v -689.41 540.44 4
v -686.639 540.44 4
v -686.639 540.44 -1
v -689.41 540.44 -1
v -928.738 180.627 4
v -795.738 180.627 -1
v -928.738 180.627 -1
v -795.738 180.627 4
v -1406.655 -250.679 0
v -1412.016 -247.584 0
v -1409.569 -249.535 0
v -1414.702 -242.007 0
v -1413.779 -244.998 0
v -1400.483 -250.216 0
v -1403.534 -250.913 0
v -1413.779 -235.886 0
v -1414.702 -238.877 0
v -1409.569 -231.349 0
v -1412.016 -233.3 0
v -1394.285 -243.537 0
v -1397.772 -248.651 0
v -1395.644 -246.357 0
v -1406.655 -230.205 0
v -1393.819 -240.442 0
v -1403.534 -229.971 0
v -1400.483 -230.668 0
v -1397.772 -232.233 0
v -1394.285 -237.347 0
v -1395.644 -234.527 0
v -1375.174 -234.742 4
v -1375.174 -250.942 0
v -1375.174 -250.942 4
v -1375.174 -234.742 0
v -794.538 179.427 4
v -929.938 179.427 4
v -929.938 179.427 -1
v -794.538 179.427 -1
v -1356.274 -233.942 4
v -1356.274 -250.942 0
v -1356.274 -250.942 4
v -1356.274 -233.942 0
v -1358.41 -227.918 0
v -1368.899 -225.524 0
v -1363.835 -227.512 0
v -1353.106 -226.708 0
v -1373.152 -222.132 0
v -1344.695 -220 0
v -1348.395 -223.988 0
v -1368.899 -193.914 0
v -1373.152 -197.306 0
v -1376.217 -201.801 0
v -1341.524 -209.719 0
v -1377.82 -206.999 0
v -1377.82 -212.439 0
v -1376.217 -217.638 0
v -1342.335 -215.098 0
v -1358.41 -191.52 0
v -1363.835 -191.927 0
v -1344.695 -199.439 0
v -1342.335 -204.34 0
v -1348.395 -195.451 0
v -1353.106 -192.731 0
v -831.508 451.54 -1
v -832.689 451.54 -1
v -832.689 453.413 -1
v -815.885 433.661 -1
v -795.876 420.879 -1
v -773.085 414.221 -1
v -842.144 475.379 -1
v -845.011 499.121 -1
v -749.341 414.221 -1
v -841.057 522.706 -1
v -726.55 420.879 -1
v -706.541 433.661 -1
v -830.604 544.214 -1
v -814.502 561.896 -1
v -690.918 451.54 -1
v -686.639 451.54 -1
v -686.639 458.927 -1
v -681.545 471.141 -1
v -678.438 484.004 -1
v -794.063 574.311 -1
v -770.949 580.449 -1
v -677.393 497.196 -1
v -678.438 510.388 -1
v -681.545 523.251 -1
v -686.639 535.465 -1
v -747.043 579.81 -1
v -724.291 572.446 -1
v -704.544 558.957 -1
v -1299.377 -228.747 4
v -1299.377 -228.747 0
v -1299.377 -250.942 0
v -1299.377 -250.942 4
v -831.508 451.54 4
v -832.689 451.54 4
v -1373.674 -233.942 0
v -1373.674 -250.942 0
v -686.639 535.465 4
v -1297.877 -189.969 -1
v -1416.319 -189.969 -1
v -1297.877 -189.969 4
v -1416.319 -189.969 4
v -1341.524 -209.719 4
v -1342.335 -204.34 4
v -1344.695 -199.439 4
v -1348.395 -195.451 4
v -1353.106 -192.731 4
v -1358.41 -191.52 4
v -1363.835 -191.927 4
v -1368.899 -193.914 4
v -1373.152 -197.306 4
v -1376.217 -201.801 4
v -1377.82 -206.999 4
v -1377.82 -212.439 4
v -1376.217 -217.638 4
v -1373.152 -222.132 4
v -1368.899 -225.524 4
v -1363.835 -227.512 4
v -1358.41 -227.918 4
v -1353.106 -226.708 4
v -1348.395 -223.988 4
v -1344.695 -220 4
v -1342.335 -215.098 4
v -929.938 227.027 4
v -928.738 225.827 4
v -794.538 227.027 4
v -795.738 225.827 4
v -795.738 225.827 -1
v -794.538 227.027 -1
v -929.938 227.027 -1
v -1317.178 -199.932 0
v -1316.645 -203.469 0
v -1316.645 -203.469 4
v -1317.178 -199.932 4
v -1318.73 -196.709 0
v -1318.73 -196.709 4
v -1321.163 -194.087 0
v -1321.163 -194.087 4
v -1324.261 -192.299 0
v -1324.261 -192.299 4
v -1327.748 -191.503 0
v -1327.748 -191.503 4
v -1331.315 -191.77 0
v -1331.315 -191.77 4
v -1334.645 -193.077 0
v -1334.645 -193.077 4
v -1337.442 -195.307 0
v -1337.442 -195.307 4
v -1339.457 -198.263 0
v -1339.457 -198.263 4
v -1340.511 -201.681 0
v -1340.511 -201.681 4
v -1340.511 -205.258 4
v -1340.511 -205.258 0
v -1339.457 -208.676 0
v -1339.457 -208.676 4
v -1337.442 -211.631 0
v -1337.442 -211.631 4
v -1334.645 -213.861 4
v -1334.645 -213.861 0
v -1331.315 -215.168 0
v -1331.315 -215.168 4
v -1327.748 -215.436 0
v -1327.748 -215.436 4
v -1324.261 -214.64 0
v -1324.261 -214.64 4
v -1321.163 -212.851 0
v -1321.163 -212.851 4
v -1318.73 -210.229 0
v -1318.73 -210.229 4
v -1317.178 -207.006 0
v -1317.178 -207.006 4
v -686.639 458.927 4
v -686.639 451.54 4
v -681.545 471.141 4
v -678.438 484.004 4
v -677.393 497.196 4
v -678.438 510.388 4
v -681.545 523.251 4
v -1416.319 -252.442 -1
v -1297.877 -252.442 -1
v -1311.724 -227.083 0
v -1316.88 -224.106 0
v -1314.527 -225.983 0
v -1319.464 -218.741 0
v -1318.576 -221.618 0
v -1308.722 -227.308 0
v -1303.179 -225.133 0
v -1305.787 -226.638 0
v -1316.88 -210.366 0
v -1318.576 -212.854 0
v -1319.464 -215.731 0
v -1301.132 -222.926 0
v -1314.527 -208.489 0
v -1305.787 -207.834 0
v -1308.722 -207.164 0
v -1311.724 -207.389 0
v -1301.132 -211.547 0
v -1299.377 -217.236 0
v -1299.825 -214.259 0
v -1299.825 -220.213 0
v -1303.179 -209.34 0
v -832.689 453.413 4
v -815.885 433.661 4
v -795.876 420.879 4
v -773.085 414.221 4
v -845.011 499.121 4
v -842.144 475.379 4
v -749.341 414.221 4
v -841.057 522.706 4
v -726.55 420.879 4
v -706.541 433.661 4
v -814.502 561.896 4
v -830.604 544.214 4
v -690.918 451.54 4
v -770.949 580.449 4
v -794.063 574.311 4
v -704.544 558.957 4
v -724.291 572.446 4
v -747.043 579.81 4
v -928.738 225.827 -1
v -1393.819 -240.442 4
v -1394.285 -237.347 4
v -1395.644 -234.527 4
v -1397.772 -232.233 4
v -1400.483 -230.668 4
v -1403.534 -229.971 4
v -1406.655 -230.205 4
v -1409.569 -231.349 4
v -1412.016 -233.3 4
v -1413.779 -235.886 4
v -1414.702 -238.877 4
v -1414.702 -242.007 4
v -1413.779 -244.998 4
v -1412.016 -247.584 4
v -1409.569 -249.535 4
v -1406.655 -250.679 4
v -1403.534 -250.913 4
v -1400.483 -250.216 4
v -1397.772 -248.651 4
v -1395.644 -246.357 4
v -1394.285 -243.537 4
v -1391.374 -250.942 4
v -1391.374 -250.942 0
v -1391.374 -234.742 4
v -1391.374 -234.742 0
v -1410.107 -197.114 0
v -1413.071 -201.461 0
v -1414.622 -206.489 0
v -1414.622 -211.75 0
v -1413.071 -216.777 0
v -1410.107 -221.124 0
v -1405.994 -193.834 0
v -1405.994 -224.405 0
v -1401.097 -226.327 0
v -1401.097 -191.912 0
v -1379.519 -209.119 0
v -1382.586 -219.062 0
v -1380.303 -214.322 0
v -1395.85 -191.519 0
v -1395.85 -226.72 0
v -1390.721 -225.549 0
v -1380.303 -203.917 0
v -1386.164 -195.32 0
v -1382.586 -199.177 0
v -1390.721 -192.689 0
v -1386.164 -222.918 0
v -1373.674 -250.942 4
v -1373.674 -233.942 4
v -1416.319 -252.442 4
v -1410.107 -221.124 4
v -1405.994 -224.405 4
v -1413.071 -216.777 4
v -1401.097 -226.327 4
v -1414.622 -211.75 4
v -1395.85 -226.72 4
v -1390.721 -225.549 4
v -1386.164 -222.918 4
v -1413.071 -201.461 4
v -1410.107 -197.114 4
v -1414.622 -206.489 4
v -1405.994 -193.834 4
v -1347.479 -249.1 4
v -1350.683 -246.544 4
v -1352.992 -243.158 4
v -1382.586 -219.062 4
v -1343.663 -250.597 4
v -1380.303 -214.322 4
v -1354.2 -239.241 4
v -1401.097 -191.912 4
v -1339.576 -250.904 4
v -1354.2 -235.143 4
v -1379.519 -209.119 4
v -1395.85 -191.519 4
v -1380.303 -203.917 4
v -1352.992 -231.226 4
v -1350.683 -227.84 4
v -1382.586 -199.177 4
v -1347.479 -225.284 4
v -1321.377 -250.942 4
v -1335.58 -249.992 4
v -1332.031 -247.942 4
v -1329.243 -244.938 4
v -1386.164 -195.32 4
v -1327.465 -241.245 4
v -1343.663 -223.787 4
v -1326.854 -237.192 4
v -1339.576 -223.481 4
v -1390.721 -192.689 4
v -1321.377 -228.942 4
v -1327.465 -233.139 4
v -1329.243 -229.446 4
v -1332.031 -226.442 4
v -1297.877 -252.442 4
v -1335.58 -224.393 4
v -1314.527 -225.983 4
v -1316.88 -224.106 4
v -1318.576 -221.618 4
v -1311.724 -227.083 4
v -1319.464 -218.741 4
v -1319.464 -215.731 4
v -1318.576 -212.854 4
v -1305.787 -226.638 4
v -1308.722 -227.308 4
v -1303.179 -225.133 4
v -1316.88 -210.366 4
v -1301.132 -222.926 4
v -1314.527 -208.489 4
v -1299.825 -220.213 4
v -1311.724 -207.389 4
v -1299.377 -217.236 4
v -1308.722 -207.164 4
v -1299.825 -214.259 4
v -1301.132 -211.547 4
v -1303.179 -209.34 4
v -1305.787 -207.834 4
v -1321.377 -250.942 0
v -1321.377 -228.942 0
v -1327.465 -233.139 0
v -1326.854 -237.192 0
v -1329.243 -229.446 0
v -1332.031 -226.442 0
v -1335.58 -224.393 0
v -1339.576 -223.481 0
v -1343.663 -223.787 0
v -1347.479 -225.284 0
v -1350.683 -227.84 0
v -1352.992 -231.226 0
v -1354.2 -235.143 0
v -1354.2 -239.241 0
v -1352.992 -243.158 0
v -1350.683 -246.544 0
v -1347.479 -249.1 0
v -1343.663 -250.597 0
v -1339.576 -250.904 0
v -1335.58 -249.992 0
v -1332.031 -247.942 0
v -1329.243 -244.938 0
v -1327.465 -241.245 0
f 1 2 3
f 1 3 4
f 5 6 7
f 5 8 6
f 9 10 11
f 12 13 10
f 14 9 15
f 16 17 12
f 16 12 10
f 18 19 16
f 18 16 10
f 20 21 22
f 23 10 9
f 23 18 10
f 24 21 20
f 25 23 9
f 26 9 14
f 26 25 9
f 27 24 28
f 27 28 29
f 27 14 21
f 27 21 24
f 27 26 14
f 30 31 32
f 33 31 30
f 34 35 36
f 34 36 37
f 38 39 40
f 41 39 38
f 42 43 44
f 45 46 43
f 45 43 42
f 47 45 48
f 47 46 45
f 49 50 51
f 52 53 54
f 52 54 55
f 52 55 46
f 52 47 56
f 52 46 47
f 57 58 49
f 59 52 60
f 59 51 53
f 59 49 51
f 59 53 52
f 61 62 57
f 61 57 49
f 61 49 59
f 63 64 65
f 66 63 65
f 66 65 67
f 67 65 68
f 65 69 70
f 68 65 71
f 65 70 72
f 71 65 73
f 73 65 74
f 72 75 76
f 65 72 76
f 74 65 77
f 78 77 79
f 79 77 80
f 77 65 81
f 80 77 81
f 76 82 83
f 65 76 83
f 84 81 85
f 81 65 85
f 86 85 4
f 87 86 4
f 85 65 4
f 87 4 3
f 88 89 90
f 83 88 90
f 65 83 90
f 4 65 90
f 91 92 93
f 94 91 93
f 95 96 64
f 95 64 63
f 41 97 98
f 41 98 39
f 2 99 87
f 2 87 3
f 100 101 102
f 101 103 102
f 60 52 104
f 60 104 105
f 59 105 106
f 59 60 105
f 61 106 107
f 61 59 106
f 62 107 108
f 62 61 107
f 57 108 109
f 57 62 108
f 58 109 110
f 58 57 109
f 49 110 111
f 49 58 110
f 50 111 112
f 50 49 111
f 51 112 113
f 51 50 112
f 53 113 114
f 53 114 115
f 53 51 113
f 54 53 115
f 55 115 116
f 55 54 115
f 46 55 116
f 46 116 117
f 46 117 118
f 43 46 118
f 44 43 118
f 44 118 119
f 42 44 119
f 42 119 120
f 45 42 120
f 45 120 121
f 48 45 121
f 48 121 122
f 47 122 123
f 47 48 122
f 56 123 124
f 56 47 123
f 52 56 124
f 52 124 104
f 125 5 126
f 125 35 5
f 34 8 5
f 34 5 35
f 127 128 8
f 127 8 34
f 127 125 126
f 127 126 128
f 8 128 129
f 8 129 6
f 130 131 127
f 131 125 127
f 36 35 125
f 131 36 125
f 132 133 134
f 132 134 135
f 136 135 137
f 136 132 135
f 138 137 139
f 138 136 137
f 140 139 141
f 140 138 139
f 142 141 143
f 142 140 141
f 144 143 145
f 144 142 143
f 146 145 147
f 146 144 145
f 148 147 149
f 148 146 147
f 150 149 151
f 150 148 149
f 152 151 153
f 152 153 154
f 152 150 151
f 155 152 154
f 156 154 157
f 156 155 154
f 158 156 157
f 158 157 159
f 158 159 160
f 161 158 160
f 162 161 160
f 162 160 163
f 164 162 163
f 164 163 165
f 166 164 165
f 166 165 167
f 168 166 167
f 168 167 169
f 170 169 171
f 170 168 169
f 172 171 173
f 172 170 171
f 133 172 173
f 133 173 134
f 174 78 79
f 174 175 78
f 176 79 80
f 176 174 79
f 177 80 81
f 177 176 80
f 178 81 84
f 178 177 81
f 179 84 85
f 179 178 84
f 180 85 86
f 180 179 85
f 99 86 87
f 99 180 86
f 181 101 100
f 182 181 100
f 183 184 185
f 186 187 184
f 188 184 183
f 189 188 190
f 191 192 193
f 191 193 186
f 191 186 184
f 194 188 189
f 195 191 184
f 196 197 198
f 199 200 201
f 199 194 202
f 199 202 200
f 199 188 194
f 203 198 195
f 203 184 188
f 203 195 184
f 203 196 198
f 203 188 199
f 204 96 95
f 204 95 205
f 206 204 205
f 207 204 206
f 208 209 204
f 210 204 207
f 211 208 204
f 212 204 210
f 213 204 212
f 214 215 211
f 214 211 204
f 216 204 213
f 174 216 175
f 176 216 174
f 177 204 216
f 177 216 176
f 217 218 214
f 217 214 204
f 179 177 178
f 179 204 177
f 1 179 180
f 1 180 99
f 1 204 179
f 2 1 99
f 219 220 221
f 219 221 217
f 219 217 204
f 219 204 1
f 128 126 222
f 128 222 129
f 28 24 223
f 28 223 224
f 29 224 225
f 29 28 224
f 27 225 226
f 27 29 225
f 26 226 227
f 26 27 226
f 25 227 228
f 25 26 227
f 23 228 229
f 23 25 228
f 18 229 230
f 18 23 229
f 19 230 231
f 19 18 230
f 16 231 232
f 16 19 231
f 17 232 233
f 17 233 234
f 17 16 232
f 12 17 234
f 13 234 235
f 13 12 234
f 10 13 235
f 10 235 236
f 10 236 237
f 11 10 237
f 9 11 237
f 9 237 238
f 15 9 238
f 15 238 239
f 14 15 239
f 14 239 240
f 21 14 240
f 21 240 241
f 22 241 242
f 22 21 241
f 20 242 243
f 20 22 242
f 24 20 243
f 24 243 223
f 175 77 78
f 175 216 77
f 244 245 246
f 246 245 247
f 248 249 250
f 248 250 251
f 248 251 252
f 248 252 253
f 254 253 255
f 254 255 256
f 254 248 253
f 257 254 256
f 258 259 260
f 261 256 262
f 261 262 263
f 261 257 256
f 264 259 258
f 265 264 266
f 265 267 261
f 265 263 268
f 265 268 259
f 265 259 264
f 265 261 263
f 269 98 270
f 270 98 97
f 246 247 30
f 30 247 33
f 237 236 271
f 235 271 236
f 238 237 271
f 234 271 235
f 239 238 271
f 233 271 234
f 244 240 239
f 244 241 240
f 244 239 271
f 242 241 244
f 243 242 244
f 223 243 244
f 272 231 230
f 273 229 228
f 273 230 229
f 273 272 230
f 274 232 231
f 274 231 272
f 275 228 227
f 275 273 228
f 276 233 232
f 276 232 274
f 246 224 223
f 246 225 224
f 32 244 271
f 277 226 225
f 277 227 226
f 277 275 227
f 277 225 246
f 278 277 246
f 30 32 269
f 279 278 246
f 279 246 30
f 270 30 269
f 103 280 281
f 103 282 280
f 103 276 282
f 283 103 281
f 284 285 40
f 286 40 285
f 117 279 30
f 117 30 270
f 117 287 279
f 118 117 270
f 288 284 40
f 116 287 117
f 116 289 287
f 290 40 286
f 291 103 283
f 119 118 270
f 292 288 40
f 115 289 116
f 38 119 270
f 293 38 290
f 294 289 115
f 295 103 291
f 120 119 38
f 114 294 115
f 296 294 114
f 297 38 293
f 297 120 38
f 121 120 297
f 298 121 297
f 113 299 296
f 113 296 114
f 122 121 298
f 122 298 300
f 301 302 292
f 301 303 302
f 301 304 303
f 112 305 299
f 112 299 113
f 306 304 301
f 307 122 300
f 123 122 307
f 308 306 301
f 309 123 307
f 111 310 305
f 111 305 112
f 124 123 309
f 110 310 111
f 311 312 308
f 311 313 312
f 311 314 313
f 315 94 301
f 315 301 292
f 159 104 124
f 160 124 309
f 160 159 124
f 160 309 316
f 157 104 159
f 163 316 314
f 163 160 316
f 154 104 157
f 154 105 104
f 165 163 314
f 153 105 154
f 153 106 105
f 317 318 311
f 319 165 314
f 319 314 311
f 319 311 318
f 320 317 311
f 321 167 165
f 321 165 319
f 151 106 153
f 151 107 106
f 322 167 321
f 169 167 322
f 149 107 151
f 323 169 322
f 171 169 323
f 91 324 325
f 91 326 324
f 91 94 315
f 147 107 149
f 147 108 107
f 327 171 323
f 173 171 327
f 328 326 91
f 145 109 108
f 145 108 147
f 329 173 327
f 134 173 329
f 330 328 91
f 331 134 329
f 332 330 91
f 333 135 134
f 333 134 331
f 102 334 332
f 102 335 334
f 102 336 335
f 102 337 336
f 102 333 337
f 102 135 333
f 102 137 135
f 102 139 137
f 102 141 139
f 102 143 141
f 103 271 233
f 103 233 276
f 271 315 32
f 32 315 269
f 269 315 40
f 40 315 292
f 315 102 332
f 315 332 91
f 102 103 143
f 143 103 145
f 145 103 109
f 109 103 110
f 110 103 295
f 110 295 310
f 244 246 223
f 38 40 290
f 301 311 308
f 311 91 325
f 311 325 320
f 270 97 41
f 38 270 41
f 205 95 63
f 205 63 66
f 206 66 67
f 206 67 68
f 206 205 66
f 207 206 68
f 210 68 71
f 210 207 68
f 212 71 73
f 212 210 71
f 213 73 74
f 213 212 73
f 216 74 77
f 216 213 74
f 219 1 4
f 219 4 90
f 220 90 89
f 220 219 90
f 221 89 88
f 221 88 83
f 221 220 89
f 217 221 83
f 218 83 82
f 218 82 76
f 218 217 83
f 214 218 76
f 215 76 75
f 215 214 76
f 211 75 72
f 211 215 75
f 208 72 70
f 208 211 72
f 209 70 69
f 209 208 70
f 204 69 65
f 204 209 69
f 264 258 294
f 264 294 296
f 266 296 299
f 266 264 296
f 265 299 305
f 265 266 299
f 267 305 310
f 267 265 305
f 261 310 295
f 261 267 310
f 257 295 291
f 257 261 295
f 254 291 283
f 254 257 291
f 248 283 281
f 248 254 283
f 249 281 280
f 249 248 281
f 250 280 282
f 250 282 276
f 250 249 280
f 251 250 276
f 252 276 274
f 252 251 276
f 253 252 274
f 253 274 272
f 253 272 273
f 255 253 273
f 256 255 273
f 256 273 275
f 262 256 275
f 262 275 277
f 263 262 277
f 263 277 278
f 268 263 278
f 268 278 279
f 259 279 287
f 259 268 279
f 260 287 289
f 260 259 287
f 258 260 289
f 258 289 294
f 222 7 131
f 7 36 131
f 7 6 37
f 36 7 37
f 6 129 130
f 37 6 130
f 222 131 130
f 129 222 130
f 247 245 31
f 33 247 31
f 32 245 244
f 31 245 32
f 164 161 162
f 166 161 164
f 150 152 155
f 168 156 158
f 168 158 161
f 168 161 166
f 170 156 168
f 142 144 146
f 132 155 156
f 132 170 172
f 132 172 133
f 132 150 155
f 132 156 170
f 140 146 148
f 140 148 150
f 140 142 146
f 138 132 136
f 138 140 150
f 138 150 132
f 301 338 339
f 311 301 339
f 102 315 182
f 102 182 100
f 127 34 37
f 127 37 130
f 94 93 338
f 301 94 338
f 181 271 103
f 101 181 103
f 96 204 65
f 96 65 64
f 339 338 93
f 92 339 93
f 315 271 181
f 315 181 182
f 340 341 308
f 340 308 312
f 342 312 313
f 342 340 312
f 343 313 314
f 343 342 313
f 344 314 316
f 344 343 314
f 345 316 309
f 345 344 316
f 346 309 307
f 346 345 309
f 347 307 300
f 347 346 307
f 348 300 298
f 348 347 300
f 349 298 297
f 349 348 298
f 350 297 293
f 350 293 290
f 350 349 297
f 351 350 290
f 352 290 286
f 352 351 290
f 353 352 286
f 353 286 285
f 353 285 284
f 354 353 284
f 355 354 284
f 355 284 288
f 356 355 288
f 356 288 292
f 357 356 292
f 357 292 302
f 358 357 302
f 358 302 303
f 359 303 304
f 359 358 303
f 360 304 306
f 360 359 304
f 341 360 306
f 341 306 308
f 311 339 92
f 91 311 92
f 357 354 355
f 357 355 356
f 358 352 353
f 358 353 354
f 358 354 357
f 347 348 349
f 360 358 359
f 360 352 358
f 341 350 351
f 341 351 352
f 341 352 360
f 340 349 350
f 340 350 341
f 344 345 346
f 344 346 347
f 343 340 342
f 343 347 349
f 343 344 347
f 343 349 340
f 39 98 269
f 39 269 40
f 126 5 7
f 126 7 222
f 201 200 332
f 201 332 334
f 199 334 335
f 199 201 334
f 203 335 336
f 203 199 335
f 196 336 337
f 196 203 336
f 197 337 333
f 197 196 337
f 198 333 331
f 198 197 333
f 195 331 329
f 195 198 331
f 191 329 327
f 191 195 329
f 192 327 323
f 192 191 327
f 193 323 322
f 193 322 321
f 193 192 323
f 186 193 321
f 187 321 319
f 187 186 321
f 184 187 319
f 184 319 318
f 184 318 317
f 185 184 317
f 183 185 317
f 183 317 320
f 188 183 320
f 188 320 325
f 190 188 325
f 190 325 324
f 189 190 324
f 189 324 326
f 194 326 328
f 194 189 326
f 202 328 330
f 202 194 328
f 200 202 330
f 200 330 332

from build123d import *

# Parameters (mm, degrees)
F1_DEPTH = 4
F0_W     = 118.4424577934
F0_H     = 62.4728963787
F0_R     = 10.5
F0_W_2   = 16.2
F0_H_2   = 16.2
F0_R_2   = 17.65
F0_W_3   = 17.4
F0_H_3   = 17
F0_R_3   = 13.75
F0_R_4   = 18.25
F0_R_5   = 12
F0_R_6   = 10.1
F0_W_4   = 135.4
F0_H_4   = 47.6
F2_DEPTH = 1


with BuildPart() as f1:
    # F0 (on Top) → F1 (new body)
    with BuildSketch(Plane.XY):
        with BuildLine():
            ThreePointArc((-686.6390468597, 458.9270639063), (-679.7373422487, 477.5109614145), (-677.3930641937, 497.1959590912))
            ThreePointArc((-677.3930641937, 497.1959590912), (-679.7373422487, 516.8809567679), (-686.6390468597, 535.4648542761))
            Line((-686.6390468597, 535.4648542761), (-686.6390468597, 458.9270639063))
        make_face()
        with BuildLine():
            Line((-686.6390468597, 458.9270639063), (-686.6390468597, 535.4648542761))
            ThreePointArc((-686.6390468597, 535.4648542761), (-687.9821758707, 537.9762165133), (-689.4098463827, 540.4404999256))
            Line((-689.4098463827, 540.4404999256), (-832.6890468597, 540.4404999256))
            Line((-832.6890468597, 540.4404999256), (-832.6890468597, 453.4126711616))
            ThreePointArc((-832.6890468597, 453.4126711616), (-832.104680652, 452.4726864479), (-831.507953399, 451.5404999256))
            Line((-831.507953399, 451.5404999256), (-690.9181749885, 451.5404999256))
            ThreePointArc((-690.9181749885, 451.5404999256), (-688.6845156605, 455.1792713627), (-686.6390468597, 458.9270639063))
        make_face()
        with BuildLine():
            ThreePointArc((-689.4098463827, 540.4404999256), (-687.9821758707, 537.9762165133), (-686.6390468597, 535.4648542761))
            Line((-686.6390468597, 535.4648542761), (-686.6390468597, 540.4404999256))
            Line((-686.6390468597, 540.4404999256), (-689.4098463827, 540.4404999256))
        make_face()
        with BuildLine():
            Line((-686.6390468597, 451.5404999256), (-686.6390468597, 458.9270639063))
            ThreePointArc((-686.6390468597, 458.9270639063), (-688.6845156605, 455.1792713627), (-690.9181749885, 451.5404999256))
            Line((-690.9181749885, 451.5404999256), (-686.6390468597, 451.5404999256))
        make_face()
        with BuildLine():
            Line((-832.6890468597, 540.4404999256), (-689.4098463827, 540.4404999256))
            ThreePointArc((-689.4098463827, 540.4404999256), (-804.7272861856, 568.8360657665), (-832.6890468597, 453.4126711616))
            Line((-832.6890468597, 453.4126711616), (-832.6890468597, 540.4404999256))
        make_face()
        with BuildLine():
            ThreePointArc((-831.507953399, 451.5404999256), (-761.2130641937, 413.3759590912), (-690.9181749885, 451.5404999256))
            Line((-690.9181749885, 451.5404999256), (-831.507953399, 451.5404999256))
        make_face()
        with BuildLine():
            ThreePointArc((-831.507953399, 451.5404999256), (-832.104680652, 452.4726864479), (-832.6890468597, 453.4126711616))
            Line((-832.6890468597, 453.4126711616), (-832.6890468597, 451.5404999256))
            Line((-832.6890468597, 451.5404999256), (-831.507953399, 451.5404999256))
        make_face()
    extrude(amount=F1_DEPTH)

    # F0 (on Top) → F2 (join)
    with BuildSketch(Plane.XY):
        with BuildLine():
            ThreePointArc((-686.6390468597, 458.9270639063), (-679.7373422487, 477.5109614145), (-677.3930641937, 497.1959590912))
            ThreePointArc((-677.3930641937, 497.1959590912), (-679.7373422487, 516.8809567679), (-686.6390468597, 535.4648542761))
            Line((-686.6390468597, 535.4648542761), (-686.6390468597, 458.9270639063))
        make_face()
        with BuildLine():
            Line((-686.6390468597, 458.9270639063), (-686.6390468597, 535.4648542761))
            ThreePointArc((-686.6390468597, 535.4648542761), (-687.9821758707, 537.9762165133), (-689.4098463827, 540.4404999256))
            Line((-689.4098463827, 540.4404999256), (-832.6890468597, 540.4404999256))
            Line((-832.6890468597, 540.4404999256), (-832.6890468597, 453.4126711616))
            ThreePointArc((-832.6890468597, 453.4126711616), (-832.104680652, 452.4726864479), (-831.507953399, 451.5404999256))
            Line((-831.507953399, 451.5404999256), (-690.9181749885, 451.5404999256))
            ThreePointArc((-690.9181749885, 451.5404999256), (-688.6845156605, 455.1792713627), (-686.6390468597, 458.9270639063))
        make_face()
        with BuildLine():
            ThreePointArc((-689.4098463827, 540.4404999256), (-687.9821758707, 537.9762165133), (-686.6390468597, 535.4648542761))
            Line((-686.6390468597, 535.4648542761), (-686.6390468597, 540.4404999256))
            Line((-686.6390468597, 540.4404999256), (-689.4098463827, 540.4404999256))
        make_face()
        with BuildLine():
            Line((-686.6390468597, 451.5404999256), (-686.6390468597, 458.9270639063))
            ThreePointArc((-686.6390468597, 458.9270639063), (-688.6845156605, 455.1792713627), (-690.9181749885, 451.5404999256))
            Line((-690.9181749885, 451.5404999256), (-686.6390468597, 451.5404999256))
        make_face()
        with BuildLine():
            Line((-832.6890468597, 540.4404999256), (-689.4098463827, 540.4404999256))
            ThreePointArc((-689.4098463827, 540.4404999256), (-804.7272861856, 568.8360657665), (-832.6890468597, 453.4126711616))
            Line((-832.6890468597, 453.4126711616), (-832.6890468597, 540.4404999256))
        make_face()
        with BuildLine():
            ThreePointArc((-831.507953399, 451.5404999256), (-761.2130641937, 413.3759590912), (-690.9181749885, 451.5404999256))
            Line((-690.9181749885, 451.5404999256), (-831.507953399, 451.5404999256))
        make_face()
        with BuildLine():
            ThreePointArc((-831.507953399, 451.5404999256), (-832.104680652, 452.4726864479), (-832.6890468597, 453.4126711616))
            Line((-832.6890468597, 453.4126711616), (-832.6890468597, 451.5404999256))
            Line((-832.6890468597, 451.5404999256), (-831.507953399, 451.5404999256))
        make_face()
    extrude(amount=-F2_DEPTH)


with BuildPart() as f1b:
    # F0 (on Top) → F1, piece 2 (new body)
    with BuildSketch(Plane.XY):
        with Locations((-1357.0977805248, -221.2056042942)):
            Rectangle(F0_W, F0_H)
        with Locations((-1404.3190094215, -240.4420524836)):
            Circle(F0_R, mode=Mode.SUBTRACT)
        with Locations((-1383.2738094807, -242.8420524836)):
            Rectangle(F0_W_2, F0_H_2, mode=Mode.SUBTRACT)
        with Locations((-1397.1690094215, -209.1191561049)):
            Circle(F0_R_2, mode=Mode.SUBTRACT)
        with Locations((-1364.9738094807, -242.4420524836)):
            Rectangle(F0_W_3, F0_H_3, mode=Mode.SUBTRACT)
        with Locations((-1340.603794799, -237.1920524836)):
            Circle(F0_R_3, mode=Mode.SUBTRACT)
        with Locations((-1359.7738225655, -209.7191561049)):
            Circle(F0_R_4, mode=Mode.SUBTRACT)
        with Locations((-1328.6450577329, -203.4691561049)):
            Circle(F0_R_5, mode=Mode.SUBTRACT)
        Polygon((-1299.3765516281, -250.9420524836), (-1321.3765516281, -250.9420524836), (-1321.3765516281, -228.9420524836), (-1299.3765516281, -228.7469919896), align=None, mode=Mode.SUBTRACT)
        with Locations((-1309.4765516281, -217.2360865438)):
            Circle(F0_R_6, mode=Mode.SUBTRACT)
    extrude(amount=F1_DEPTH)

    # F0 (on Top) → F2, piece 2 (join)
    with BuildSketch(Plane.XY):
        with Locations((-1357.0977805248, -221.2056042942)):
            Rectangle(F0_W, F0_H)
        with Locations((-1404.3190094215, -240.4420524836)):
            Circle(F0_R, mode=Mode.SUBTRACT)
        with Locations((-1383.2738094807, -242.8420524836)):
            Rectangle(F0_W_2, F0_H_2, mode=Mode.SUBTRACT)
        with Locations((-1397.1690094215, -209.1191561049)):
            Circle(F0_R_2, mode=Mode.SUBTRACT)
        with Locations((-1364.9738094807, -242.4420524836)):
            Rectangle(F0_W_3, F0_H_3, mode=Mode.SUBTRACT)
        with Locations((-1340.603794799, -237.1920524836)):
            Circle(F0_R_3, mode=Mode.SUBTRACT)
        with Locations((-1359.7738225655, -209.7191561049)):
            Circle(F0_R_4, mode=Mode.SUBTRACT)
        with Locations((-1328.6450577329, -203.4691561049)):
            Circle(F0_R_5, mode=Mode.SUBTRACT)
        Polygon((-1299.3765516281, -250.9420524836), (-1321.3765516281, -250.9420524836), (-1321.3765516281, -228.9420524836), (-1299.3765516281, -228.7469919896), align=None, mode=Mode.SUBTRACT)
        with Locations((-1309.4765516281, -217.2360865438)):
            Circle(F0_R_6, mode=Mode.SUBTRACT)
        with Locations((-1397.1690094215, -209.1191561049)):
            Circle(F0_R_2)
        with Locations((-1359.7738225655, -209.7191561049)):
            Circle(F0_R_4)
        with Locations((-1328.6450577329, -203.4691561049)):
            Circle(F0_R_5)
        with Locations((-1309.4765516281, -217.2360865438)):
            Circle(F0_R_6)
        Polygon((-1321.3765516281, -228.9420524836), (-1321.3765516281, -250.9420524836), (-1299.3765516281, -250.9420524836), (-1299.3765516281, -228.7469919896), align=None)
        with Locations((-1340.603794799, -237.1920524836)):
            Circle(F0_R_3)
        with Locations((-1364.9738094807, -242.4420524836)):
            Rectangle(F0_W_3, F0_H_3)
        with Locations((-1383.2738094807, -242.8420524836)):
            Rectangle(F0_W_2, F0_H_2)
        with Locations((-1404.3190094215, -240.4420524836)):
            Circle(F0_R)
    extrude(amount=-F2_DEPTH)


with BuildPart() as f1c:
    # F0 (on Top) → F1, piece 3 (new body)
    with BuildSketch(Plane.XY):
        with Locations((-862.2379980087, 203.2270629168)):
            Rectangle(F0_W_4, F0_H_4)
        Polygon((-906.7379980087, 180.6270629168), (-928.7379980087, 180.6270629168), (-928.7379980087, 202.6270629168), (-928.7379980087, 203.8270629168), (-928.7379980087, 225.8270629168), (-906.7379980087, 225.8270629168), (-884.7379980087, 225.8270629168), (-862.7379980087, 225.8270629168), (-840.7379980087, 225.8270629168), (-818.7379980087, 225.8270629168), (-796.7379980087, 225.8270629168), (-795.7379980087, 225.8270629168), (-795.7379980087, 180.6270629168), (-796.7379980087, 180.6270629168), (-818.7379980087, 180.6270629168), (-840.7379980087, 180.6270629168), (-862.7379980087, 180.6270629168), (-884.7379980087, 180.6270629168), align=None, mode=Mode.SUBTRACT)
    extrude(amount=F1_DEPTH)

    # F0 (on Top) → F2, piece 3 (join)
    with BuildSketch(Plane.XY):
        with Locations((-862.2379980087, 203.2270629168)):
            Rectangle(F0_W_4, F0_H_4)
        Polygon((-906.7379980087, 180.6270629168), (-928.7379980087, 180.6270629168), (-928.7379980087, 202.6270629168), (-928.7379980087, 203.8270629168), (-928.7379980087, 225.8270629168), (-906.7379980087, 225.8270629168), (-884.7379980087, 225.8270629168), (-862.7379980087, 225.8270629168), (-840.7379980087, 225.8270629168), (-818.7379980087, 225.8270629168), (-796.7379980087, 225.8270629168), (-795.7379980087, 225.8270629168), (-795.7379980087, 180.6270629168), (-796.7379980087, 180.6270629168), (-818.7379980087, 180.6270629168), (-840.7379980087, 180.6270629168), (-862.7379980087, 180.6270629168), (-884.7379980087, 180.6270629168), align=None, mode=Mode.SUBTRACT)
    extrude(amount=-F2_DEPTH)


solid = Compound([f1.part, f1b.part, f1c.part])
